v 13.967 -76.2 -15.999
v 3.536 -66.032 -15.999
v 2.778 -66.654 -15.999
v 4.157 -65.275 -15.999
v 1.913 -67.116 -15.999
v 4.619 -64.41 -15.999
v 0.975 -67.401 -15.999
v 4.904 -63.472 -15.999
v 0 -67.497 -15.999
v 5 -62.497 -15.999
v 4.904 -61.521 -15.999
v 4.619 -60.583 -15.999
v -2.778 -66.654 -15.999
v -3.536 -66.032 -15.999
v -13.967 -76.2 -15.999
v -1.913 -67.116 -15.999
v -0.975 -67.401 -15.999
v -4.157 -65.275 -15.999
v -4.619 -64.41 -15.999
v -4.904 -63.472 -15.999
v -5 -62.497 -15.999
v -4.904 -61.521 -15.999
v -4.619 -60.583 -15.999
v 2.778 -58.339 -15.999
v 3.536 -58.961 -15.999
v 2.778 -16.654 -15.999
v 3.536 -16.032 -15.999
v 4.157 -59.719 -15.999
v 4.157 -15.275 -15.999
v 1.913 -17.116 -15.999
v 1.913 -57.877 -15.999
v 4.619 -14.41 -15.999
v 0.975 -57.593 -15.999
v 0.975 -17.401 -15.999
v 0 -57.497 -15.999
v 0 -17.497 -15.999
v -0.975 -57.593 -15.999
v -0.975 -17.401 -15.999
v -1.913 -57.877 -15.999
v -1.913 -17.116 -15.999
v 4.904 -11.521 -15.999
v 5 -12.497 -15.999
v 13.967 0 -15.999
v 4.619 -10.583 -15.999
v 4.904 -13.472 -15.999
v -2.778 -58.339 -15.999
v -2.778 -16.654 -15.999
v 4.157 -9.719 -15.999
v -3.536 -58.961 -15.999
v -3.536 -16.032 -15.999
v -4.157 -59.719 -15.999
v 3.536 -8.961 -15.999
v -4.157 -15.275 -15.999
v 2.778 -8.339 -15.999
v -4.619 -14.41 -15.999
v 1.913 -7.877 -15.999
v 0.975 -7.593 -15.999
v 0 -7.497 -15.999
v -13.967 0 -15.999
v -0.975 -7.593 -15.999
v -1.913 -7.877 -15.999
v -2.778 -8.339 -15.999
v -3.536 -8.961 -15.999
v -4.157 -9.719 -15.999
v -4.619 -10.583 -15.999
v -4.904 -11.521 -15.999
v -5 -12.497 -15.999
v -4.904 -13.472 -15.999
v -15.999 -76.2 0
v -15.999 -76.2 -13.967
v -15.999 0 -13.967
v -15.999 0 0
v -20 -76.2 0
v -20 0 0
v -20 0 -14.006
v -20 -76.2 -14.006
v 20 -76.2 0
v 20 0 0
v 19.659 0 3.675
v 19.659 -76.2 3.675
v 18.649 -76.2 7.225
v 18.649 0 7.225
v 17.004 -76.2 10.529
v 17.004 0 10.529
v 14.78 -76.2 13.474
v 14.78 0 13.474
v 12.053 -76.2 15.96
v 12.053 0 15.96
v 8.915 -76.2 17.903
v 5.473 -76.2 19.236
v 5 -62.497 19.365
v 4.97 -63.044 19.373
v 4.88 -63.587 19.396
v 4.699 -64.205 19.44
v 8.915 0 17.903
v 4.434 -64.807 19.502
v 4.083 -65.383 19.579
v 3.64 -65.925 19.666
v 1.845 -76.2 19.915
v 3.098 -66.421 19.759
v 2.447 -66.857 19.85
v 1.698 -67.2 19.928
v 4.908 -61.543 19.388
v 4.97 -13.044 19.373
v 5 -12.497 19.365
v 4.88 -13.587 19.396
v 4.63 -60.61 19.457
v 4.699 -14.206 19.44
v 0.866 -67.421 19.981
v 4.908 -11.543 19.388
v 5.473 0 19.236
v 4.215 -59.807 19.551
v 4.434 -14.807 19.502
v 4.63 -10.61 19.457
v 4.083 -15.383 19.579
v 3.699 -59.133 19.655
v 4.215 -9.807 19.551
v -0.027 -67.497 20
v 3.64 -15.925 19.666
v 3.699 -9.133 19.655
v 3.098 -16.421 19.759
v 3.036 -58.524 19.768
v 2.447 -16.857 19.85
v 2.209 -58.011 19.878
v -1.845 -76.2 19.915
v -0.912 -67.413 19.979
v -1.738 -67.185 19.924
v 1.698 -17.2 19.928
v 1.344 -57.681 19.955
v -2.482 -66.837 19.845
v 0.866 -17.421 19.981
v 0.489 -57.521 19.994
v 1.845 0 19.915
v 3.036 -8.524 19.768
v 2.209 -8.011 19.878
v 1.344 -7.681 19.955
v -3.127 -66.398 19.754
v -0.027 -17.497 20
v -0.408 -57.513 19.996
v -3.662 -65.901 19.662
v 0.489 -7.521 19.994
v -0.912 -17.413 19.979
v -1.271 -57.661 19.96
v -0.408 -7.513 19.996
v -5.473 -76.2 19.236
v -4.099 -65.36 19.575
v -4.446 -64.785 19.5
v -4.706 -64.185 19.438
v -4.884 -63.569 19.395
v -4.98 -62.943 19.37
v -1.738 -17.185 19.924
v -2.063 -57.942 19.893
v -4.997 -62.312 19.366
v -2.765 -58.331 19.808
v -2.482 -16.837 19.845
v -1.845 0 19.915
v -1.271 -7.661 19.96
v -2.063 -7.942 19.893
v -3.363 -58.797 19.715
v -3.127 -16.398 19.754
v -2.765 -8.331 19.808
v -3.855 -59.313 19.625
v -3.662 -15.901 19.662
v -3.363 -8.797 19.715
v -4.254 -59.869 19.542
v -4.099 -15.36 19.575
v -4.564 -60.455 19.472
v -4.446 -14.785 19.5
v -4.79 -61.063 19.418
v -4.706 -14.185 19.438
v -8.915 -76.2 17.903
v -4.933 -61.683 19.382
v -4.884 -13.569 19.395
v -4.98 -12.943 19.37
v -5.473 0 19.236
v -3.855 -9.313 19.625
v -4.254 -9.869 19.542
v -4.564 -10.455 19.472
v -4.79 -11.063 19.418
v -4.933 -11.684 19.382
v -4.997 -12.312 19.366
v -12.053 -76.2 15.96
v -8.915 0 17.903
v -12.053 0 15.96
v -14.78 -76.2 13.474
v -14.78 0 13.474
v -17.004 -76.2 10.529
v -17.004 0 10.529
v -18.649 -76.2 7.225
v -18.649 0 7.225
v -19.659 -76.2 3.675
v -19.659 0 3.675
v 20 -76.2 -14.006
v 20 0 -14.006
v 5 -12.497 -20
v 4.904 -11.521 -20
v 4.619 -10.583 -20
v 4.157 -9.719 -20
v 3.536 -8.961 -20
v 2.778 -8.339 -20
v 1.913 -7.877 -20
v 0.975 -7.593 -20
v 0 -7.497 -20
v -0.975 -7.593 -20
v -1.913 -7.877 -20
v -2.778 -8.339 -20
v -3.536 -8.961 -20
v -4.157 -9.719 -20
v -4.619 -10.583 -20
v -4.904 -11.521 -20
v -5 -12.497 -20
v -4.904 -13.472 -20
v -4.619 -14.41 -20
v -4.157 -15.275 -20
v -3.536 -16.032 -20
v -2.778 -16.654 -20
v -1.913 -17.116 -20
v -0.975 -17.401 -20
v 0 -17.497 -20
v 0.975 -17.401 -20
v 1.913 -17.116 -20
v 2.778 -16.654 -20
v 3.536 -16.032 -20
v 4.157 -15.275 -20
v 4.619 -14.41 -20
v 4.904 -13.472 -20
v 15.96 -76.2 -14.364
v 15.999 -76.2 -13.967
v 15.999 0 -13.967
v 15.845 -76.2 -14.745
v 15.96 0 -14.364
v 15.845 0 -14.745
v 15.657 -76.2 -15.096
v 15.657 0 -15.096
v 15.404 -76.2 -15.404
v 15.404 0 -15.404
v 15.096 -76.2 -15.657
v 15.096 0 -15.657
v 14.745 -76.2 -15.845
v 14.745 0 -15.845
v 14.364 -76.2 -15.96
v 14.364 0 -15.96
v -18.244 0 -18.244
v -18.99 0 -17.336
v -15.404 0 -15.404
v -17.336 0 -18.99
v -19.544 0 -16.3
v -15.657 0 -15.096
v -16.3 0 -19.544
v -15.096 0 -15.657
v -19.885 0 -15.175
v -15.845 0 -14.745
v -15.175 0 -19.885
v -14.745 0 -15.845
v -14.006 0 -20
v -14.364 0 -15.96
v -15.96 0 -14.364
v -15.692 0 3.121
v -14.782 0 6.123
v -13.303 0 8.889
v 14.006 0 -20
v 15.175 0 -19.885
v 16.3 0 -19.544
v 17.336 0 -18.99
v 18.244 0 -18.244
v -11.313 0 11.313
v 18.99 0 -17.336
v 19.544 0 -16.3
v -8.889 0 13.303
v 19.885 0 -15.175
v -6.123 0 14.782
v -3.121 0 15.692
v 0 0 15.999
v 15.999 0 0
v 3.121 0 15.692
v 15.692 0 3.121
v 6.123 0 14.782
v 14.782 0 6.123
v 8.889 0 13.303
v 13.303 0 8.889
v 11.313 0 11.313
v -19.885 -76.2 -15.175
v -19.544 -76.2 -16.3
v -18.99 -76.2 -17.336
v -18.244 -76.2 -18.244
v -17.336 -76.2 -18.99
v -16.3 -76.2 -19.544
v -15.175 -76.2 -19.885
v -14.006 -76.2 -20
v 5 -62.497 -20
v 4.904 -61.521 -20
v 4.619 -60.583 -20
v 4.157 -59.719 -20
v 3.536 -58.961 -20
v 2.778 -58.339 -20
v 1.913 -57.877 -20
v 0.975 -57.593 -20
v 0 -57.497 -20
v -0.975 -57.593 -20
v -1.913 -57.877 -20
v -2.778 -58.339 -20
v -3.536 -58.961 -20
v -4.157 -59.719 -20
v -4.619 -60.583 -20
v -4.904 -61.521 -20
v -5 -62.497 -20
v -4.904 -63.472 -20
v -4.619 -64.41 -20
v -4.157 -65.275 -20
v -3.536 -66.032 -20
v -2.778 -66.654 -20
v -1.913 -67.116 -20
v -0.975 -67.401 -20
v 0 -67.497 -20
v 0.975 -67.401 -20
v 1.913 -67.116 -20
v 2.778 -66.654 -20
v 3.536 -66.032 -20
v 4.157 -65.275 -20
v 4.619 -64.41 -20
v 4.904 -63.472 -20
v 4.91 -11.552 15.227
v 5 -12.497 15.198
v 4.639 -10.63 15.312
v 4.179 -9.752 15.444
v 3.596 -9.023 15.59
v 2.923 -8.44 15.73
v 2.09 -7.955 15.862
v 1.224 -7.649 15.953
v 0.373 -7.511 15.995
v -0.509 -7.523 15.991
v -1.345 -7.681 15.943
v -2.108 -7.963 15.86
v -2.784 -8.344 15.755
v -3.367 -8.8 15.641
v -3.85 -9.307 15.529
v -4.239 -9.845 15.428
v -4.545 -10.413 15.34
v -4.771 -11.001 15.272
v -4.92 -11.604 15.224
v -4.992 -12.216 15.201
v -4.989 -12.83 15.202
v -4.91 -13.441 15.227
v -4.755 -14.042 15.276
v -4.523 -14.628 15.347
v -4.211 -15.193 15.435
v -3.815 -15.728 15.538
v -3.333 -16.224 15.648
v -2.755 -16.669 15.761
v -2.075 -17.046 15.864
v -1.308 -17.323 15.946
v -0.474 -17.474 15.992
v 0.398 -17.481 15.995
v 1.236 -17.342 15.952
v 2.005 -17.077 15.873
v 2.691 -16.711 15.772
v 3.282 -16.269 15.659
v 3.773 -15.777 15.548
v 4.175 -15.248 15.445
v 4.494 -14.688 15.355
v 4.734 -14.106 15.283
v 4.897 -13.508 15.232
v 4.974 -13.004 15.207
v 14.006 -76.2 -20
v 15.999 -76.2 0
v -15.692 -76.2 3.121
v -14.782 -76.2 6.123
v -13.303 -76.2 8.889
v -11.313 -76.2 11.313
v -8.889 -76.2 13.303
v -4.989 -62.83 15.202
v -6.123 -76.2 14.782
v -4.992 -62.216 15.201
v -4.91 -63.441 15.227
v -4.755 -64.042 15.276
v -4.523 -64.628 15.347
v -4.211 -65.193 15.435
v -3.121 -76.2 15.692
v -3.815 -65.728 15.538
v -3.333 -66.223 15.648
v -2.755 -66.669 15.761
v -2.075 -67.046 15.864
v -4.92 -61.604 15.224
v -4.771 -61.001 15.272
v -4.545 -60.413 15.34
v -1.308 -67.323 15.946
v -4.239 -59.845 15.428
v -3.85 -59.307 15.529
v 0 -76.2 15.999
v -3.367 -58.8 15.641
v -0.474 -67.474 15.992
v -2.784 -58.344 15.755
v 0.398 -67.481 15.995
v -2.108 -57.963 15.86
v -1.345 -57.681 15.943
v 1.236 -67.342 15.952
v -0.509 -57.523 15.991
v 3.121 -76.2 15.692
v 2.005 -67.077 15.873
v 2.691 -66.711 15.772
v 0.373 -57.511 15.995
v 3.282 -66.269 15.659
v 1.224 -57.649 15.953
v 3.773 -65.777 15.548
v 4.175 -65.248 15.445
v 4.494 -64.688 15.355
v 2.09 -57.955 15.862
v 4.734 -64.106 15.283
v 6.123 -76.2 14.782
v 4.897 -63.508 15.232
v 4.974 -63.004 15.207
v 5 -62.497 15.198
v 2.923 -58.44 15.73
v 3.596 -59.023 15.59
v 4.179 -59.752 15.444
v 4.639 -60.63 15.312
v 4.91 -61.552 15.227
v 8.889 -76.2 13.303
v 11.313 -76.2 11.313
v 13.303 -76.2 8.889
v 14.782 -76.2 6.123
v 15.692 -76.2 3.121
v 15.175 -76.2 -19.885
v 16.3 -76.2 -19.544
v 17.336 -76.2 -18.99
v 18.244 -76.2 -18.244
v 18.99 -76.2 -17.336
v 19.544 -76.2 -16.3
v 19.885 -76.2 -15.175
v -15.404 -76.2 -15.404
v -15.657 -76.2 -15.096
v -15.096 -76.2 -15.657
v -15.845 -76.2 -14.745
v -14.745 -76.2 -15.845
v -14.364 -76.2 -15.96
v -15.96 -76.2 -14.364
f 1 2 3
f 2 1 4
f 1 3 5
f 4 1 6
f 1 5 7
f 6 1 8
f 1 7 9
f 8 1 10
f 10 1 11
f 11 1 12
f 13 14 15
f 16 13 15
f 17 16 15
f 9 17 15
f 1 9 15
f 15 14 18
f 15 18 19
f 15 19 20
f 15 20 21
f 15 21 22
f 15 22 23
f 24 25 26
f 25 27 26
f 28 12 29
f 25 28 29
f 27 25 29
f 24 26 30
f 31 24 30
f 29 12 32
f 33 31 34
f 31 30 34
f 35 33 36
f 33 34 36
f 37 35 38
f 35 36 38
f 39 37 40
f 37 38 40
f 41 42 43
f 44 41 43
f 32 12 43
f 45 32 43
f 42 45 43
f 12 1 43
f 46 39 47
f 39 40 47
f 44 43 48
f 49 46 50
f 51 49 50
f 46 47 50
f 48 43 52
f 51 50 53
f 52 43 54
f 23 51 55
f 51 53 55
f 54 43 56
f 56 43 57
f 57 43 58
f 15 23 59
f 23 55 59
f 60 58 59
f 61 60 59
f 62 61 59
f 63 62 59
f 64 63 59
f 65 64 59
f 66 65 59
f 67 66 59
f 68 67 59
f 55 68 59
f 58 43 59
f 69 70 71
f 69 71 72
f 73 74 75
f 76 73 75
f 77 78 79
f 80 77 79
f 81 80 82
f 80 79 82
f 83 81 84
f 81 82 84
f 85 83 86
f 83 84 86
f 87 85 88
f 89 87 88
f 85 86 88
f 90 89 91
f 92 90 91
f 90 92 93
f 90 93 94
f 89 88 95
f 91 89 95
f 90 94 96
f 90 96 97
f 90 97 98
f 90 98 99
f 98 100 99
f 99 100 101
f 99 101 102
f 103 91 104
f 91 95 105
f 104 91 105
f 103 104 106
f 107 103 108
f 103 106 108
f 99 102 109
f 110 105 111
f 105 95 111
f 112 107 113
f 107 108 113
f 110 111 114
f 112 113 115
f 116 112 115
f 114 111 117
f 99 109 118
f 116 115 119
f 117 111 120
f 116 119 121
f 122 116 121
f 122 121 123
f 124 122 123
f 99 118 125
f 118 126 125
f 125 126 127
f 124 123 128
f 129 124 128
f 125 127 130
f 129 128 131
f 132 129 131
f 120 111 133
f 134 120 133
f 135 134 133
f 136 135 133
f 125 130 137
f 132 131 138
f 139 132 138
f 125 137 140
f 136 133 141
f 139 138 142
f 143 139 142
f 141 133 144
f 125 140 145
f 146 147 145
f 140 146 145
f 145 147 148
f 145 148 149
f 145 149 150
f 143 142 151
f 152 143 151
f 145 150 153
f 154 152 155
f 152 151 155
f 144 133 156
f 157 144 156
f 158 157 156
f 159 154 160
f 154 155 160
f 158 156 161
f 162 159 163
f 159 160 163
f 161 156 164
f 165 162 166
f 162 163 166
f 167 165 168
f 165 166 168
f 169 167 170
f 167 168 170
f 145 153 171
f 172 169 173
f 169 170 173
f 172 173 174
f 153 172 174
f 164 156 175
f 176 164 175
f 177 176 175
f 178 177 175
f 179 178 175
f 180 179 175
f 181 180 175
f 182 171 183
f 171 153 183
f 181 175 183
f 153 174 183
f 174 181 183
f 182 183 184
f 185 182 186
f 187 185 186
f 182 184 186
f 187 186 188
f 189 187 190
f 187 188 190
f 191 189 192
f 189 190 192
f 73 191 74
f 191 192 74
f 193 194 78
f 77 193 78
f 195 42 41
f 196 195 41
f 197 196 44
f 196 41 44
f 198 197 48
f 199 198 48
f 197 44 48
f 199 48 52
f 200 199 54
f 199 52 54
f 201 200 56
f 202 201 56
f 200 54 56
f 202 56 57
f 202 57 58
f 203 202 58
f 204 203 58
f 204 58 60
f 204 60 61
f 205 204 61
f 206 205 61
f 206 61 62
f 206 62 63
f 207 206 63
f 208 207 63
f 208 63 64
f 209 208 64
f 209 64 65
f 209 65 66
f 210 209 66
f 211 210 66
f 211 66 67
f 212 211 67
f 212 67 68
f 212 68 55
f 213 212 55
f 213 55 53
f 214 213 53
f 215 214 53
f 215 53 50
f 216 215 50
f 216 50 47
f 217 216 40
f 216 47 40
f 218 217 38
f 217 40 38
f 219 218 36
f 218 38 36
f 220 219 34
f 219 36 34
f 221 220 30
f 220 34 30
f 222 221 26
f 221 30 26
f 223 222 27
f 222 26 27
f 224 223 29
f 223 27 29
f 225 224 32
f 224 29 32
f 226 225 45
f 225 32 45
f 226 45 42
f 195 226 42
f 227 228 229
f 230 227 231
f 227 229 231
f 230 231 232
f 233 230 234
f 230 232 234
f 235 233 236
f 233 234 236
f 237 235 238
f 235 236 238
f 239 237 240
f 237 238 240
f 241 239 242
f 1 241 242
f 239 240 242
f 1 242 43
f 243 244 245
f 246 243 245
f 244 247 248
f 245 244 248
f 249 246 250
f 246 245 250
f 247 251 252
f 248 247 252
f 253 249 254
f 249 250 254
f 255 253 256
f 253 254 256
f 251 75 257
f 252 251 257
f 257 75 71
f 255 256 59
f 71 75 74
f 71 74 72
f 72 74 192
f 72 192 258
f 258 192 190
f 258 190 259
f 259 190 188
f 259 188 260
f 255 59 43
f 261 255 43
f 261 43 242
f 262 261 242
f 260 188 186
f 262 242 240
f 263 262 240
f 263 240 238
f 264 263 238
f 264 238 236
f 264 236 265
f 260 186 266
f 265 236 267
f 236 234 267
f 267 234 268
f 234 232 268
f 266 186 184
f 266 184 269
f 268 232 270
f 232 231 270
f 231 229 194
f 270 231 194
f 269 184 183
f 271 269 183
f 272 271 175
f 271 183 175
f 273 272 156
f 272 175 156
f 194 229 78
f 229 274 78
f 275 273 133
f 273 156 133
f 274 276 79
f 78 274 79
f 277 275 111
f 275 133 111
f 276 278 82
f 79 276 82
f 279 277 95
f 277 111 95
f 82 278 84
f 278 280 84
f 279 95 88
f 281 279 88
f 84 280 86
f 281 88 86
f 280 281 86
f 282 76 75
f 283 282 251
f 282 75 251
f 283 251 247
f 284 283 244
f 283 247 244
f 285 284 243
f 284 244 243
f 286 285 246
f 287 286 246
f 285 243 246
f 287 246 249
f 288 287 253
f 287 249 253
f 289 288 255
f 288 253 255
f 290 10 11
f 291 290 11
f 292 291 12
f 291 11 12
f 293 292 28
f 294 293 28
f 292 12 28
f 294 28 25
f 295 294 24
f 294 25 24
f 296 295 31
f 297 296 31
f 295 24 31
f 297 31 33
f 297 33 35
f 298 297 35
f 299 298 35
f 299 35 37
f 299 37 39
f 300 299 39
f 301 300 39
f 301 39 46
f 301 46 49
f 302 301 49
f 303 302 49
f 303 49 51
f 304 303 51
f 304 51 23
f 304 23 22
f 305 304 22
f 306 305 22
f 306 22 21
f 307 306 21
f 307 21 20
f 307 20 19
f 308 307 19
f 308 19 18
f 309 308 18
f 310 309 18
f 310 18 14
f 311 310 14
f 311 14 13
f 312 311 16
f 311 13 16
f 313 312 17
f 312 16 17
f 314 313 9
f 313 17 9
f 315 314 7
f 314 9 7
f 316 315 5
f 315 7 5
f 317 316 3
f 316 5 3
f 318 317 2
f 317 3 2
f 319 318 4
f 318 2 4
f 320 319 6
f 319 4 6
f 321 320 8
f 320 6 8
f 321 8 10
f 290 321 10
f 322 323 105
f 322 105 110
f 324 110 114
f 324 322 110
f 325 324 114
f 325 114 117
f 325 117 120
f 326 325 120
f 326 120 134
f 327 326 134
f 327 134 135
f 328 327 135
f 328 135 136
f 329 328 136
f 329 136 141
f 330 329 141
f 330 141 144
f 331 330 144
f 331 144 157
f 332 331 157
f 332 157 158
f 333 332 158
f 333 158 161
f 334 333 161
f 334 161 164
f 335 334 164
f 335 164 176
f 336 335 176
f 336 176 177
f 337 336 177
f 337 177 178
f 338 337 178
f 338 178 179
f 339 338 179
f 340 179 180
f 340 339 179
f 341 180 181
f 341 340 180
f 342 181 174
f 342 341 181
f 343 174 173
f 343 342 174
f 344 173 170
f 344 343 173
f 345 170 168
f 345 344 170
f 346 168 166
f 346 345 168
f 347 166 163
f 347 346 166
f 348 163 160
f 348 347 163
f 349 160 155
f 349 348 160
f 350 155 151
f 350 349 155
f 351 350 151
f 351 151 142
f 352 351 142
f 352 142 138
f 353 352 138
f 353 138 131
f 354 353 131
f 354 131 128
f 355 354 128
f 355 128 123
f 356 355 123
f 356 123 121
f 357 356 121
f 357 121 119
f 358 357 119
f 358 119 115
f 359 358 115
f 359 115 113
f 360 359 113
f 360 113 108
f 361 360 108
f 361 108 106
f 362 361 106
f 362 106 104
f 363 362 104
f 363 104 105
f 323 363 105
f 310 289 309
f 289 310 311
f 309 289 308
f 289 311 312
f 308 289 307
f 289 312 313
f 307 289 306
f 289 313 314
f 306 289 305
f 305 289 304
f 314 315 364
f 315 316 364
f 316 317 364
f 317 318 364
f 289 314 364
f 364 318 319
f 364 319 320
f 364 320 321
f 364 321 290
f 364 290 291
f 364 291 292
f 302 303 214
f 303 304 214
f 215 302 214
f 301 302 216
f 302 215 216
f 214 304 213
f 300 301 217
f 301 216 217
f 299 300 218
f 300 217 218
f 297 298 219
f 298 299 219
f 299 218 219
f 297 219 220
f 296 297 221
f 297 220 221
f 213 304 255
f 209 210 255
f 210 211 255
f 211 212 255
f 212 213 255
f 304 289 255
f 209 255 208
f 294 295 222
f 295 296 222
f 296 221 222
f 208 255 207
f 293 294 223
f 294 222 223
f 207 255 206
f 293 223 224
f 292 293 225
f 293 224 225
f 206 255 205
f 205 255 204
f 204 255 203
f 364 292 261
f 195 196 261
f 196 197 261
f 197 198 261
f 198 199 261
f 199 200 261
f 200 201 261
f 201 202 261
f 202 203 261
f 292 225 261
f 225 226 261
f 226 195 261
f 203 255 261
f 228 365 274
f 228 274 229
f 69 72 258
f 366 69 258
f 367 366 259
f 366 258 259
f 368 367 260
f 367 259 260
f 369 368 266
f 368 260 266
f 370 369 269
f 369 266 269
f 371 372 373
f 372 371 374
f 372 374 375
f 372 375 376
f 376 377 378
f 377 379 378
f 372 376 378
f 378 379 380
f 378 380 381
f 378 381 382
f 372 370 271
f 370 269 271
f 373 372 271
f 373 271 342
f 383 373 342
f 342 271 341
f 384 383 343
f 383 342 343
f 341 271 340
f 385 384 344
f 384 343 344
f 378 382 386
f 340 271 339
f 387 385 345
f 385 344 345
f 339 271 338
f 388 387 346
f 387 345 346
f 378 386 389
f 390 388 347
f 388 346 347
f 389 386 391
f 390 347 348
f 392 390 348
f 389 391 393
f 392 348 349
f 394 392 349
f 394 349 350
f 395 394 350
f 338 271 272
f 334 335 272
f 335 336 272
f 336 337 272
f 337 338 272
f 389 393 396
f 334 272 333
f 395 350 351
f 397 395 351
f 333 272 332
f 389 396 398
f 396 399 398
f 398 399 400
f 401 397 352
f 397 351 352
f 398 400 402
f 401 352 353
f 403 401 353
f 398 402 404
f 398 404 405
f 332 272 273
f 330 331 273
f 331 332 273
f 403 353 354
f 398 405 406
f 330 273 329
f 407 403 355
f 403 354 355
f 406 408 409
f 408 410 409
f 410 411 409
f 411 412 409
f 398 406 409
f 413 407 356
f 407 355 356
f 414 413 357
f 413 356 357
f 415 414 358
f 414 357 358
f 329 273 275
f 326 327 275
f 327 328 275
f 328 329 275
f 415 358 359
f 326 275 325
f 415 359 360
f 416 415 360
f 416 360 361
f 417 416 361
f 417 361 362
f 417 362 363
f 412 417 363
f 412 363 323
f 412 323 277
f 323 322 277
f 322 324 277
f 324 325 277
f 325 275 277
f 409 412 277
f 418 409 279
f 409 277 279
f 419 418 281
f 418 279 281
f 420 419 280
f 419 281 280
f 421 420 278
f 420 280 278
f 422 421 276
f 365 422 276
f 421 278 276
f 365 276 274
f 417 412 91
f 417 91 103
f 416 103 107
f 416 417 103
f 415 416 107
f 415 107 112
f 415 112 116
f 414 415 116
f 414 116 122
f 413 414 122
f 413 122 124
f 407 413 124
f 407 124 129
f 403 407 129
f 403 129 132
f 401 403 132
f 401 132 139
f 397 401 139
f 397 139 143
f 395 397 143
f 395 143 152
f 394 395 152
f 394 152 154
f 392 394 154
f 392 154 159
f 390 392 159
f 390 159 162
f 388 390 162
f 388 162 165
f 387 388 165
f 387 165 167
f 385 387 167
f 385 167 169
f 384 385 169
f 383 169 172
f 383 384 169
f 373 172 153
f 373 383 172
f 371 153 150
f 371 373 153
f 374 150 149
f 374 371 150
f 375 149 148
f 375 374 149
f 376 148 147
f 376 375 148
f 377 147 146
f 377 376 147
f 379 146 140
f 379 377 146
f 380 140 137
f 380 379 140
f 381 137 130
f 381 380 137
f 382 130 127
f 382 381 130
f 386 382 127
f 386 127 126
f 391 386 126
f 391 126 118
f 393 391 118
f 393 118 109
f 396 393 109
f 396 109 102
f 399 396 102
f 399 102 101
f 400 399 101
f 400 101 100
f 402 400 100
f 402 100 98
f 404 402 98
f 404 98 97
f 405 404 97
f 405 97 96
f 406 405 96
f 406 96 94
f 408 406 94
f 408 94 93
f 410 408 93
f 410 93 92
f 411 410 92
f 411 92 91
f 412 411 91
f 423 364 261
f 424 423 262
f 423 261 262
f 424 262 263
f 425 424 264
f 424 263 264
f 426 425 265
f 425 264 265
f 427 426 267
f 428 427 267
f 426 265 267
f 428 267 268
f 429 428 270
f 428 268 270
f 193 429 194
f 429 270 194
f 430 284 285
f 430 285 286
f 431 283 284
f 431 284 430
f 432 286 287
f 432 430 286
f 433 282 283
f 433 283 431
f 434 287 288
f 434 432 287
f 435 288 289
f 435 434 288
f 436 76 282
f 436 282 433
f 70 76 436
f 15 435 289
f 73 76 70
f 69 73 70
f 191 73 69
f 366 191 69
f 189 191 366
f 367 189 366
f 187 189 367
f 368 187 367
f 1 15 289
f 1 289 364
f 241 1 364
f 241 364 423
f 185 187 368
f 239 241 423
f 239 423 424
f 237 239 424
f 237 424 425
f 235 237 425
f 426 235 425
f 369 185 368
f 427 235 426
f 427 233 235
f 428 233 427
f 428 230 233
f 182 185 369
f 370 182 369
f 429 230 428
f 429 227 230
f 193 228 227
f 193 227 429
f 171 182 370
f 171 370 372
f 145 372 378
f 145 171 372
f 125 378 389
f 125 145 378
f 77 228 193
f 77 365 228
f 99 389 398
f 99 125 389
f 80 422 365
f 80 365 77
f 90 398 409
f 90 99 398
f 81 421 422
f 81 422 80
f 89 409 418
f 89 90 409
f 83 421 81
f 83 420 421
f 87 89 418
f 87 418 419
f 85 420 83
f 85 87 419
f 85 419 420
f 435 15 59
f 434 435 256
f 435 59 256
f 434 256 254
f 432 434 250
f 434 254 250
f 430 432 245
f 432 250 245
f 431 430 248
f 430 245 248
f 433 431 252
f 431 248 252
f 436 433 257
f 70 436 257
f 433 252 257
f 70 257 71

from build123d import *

# Parameters (mm, degrees)
F1_DEPTH      = 76.2
F2_R          = 4.99999
F3_DEPTH      = 20.00096
F3_DEPTH_BACK = 25.4


with BuildPart() as f1:
    # F0 (on Front) → F1 (new body)
    with BuildSketch(Plane.XZ):
        with BuildLine():
            ThreePointArc((19.99996, 0), (0, 19.99996), (-19.99996, 0))
            Line((-19.99996, 0), (-19.99996, -14.00556))
            ThreePointArc((-19.99996, -14.00556), (-18.2442408891, -18.2442408891), (-14.00556, -19.99996))
            Line((-14.00556, -19.99996), (14.00556, -19.99996))
            ThreePointArc((14.00556, -19.99996), (18.2442408891, -18.2442408891), (19.99996, -14.00556))
            Line((19.99996, -14.00556), (19.99996, 0))
        make_face()
        with BuildLine():
            Line((-15.99946, -13.96746), (-15.99946, 0))
            ThreePointArc((-15.99946, 0), (0, 15.99946), (15.99946, 0))
            Line((15.99946, 0), (15.99946, -13.96746))
            ThreePointArc((15.99946, -13.96746), (15.4043009794, -15.4043009794), (13.96746, -15.99946))
            Line((13.96746, -15.99946), (-13.96746, -15.99946))
            ThreePointArc((-13.96746, -15.99946), (-15.4043009794, -15.4043009794), (-15.99946, -13.96746))
        make_face(mode=Mode.SUBTRACT)
    extrude(amount=F1_DEPTH)

    # F2 (on Top) → F3 (cut, two sides)
    with BuildSketch(Plane.XY) as f3_sk:
        with Locations((0, -62.4967)):
            Circle(F2_R)
        with Locations((0, -12.4968)):
            Circle(F2_R)
    extrude(amount=-F3_DEPTH, mode=Mode.SUBTRACT)
    extrude(f3_sk.sketch, amount=F3_DEPTH_BACK, mode=Mode.SUBTRACT)


solid = f1.part
